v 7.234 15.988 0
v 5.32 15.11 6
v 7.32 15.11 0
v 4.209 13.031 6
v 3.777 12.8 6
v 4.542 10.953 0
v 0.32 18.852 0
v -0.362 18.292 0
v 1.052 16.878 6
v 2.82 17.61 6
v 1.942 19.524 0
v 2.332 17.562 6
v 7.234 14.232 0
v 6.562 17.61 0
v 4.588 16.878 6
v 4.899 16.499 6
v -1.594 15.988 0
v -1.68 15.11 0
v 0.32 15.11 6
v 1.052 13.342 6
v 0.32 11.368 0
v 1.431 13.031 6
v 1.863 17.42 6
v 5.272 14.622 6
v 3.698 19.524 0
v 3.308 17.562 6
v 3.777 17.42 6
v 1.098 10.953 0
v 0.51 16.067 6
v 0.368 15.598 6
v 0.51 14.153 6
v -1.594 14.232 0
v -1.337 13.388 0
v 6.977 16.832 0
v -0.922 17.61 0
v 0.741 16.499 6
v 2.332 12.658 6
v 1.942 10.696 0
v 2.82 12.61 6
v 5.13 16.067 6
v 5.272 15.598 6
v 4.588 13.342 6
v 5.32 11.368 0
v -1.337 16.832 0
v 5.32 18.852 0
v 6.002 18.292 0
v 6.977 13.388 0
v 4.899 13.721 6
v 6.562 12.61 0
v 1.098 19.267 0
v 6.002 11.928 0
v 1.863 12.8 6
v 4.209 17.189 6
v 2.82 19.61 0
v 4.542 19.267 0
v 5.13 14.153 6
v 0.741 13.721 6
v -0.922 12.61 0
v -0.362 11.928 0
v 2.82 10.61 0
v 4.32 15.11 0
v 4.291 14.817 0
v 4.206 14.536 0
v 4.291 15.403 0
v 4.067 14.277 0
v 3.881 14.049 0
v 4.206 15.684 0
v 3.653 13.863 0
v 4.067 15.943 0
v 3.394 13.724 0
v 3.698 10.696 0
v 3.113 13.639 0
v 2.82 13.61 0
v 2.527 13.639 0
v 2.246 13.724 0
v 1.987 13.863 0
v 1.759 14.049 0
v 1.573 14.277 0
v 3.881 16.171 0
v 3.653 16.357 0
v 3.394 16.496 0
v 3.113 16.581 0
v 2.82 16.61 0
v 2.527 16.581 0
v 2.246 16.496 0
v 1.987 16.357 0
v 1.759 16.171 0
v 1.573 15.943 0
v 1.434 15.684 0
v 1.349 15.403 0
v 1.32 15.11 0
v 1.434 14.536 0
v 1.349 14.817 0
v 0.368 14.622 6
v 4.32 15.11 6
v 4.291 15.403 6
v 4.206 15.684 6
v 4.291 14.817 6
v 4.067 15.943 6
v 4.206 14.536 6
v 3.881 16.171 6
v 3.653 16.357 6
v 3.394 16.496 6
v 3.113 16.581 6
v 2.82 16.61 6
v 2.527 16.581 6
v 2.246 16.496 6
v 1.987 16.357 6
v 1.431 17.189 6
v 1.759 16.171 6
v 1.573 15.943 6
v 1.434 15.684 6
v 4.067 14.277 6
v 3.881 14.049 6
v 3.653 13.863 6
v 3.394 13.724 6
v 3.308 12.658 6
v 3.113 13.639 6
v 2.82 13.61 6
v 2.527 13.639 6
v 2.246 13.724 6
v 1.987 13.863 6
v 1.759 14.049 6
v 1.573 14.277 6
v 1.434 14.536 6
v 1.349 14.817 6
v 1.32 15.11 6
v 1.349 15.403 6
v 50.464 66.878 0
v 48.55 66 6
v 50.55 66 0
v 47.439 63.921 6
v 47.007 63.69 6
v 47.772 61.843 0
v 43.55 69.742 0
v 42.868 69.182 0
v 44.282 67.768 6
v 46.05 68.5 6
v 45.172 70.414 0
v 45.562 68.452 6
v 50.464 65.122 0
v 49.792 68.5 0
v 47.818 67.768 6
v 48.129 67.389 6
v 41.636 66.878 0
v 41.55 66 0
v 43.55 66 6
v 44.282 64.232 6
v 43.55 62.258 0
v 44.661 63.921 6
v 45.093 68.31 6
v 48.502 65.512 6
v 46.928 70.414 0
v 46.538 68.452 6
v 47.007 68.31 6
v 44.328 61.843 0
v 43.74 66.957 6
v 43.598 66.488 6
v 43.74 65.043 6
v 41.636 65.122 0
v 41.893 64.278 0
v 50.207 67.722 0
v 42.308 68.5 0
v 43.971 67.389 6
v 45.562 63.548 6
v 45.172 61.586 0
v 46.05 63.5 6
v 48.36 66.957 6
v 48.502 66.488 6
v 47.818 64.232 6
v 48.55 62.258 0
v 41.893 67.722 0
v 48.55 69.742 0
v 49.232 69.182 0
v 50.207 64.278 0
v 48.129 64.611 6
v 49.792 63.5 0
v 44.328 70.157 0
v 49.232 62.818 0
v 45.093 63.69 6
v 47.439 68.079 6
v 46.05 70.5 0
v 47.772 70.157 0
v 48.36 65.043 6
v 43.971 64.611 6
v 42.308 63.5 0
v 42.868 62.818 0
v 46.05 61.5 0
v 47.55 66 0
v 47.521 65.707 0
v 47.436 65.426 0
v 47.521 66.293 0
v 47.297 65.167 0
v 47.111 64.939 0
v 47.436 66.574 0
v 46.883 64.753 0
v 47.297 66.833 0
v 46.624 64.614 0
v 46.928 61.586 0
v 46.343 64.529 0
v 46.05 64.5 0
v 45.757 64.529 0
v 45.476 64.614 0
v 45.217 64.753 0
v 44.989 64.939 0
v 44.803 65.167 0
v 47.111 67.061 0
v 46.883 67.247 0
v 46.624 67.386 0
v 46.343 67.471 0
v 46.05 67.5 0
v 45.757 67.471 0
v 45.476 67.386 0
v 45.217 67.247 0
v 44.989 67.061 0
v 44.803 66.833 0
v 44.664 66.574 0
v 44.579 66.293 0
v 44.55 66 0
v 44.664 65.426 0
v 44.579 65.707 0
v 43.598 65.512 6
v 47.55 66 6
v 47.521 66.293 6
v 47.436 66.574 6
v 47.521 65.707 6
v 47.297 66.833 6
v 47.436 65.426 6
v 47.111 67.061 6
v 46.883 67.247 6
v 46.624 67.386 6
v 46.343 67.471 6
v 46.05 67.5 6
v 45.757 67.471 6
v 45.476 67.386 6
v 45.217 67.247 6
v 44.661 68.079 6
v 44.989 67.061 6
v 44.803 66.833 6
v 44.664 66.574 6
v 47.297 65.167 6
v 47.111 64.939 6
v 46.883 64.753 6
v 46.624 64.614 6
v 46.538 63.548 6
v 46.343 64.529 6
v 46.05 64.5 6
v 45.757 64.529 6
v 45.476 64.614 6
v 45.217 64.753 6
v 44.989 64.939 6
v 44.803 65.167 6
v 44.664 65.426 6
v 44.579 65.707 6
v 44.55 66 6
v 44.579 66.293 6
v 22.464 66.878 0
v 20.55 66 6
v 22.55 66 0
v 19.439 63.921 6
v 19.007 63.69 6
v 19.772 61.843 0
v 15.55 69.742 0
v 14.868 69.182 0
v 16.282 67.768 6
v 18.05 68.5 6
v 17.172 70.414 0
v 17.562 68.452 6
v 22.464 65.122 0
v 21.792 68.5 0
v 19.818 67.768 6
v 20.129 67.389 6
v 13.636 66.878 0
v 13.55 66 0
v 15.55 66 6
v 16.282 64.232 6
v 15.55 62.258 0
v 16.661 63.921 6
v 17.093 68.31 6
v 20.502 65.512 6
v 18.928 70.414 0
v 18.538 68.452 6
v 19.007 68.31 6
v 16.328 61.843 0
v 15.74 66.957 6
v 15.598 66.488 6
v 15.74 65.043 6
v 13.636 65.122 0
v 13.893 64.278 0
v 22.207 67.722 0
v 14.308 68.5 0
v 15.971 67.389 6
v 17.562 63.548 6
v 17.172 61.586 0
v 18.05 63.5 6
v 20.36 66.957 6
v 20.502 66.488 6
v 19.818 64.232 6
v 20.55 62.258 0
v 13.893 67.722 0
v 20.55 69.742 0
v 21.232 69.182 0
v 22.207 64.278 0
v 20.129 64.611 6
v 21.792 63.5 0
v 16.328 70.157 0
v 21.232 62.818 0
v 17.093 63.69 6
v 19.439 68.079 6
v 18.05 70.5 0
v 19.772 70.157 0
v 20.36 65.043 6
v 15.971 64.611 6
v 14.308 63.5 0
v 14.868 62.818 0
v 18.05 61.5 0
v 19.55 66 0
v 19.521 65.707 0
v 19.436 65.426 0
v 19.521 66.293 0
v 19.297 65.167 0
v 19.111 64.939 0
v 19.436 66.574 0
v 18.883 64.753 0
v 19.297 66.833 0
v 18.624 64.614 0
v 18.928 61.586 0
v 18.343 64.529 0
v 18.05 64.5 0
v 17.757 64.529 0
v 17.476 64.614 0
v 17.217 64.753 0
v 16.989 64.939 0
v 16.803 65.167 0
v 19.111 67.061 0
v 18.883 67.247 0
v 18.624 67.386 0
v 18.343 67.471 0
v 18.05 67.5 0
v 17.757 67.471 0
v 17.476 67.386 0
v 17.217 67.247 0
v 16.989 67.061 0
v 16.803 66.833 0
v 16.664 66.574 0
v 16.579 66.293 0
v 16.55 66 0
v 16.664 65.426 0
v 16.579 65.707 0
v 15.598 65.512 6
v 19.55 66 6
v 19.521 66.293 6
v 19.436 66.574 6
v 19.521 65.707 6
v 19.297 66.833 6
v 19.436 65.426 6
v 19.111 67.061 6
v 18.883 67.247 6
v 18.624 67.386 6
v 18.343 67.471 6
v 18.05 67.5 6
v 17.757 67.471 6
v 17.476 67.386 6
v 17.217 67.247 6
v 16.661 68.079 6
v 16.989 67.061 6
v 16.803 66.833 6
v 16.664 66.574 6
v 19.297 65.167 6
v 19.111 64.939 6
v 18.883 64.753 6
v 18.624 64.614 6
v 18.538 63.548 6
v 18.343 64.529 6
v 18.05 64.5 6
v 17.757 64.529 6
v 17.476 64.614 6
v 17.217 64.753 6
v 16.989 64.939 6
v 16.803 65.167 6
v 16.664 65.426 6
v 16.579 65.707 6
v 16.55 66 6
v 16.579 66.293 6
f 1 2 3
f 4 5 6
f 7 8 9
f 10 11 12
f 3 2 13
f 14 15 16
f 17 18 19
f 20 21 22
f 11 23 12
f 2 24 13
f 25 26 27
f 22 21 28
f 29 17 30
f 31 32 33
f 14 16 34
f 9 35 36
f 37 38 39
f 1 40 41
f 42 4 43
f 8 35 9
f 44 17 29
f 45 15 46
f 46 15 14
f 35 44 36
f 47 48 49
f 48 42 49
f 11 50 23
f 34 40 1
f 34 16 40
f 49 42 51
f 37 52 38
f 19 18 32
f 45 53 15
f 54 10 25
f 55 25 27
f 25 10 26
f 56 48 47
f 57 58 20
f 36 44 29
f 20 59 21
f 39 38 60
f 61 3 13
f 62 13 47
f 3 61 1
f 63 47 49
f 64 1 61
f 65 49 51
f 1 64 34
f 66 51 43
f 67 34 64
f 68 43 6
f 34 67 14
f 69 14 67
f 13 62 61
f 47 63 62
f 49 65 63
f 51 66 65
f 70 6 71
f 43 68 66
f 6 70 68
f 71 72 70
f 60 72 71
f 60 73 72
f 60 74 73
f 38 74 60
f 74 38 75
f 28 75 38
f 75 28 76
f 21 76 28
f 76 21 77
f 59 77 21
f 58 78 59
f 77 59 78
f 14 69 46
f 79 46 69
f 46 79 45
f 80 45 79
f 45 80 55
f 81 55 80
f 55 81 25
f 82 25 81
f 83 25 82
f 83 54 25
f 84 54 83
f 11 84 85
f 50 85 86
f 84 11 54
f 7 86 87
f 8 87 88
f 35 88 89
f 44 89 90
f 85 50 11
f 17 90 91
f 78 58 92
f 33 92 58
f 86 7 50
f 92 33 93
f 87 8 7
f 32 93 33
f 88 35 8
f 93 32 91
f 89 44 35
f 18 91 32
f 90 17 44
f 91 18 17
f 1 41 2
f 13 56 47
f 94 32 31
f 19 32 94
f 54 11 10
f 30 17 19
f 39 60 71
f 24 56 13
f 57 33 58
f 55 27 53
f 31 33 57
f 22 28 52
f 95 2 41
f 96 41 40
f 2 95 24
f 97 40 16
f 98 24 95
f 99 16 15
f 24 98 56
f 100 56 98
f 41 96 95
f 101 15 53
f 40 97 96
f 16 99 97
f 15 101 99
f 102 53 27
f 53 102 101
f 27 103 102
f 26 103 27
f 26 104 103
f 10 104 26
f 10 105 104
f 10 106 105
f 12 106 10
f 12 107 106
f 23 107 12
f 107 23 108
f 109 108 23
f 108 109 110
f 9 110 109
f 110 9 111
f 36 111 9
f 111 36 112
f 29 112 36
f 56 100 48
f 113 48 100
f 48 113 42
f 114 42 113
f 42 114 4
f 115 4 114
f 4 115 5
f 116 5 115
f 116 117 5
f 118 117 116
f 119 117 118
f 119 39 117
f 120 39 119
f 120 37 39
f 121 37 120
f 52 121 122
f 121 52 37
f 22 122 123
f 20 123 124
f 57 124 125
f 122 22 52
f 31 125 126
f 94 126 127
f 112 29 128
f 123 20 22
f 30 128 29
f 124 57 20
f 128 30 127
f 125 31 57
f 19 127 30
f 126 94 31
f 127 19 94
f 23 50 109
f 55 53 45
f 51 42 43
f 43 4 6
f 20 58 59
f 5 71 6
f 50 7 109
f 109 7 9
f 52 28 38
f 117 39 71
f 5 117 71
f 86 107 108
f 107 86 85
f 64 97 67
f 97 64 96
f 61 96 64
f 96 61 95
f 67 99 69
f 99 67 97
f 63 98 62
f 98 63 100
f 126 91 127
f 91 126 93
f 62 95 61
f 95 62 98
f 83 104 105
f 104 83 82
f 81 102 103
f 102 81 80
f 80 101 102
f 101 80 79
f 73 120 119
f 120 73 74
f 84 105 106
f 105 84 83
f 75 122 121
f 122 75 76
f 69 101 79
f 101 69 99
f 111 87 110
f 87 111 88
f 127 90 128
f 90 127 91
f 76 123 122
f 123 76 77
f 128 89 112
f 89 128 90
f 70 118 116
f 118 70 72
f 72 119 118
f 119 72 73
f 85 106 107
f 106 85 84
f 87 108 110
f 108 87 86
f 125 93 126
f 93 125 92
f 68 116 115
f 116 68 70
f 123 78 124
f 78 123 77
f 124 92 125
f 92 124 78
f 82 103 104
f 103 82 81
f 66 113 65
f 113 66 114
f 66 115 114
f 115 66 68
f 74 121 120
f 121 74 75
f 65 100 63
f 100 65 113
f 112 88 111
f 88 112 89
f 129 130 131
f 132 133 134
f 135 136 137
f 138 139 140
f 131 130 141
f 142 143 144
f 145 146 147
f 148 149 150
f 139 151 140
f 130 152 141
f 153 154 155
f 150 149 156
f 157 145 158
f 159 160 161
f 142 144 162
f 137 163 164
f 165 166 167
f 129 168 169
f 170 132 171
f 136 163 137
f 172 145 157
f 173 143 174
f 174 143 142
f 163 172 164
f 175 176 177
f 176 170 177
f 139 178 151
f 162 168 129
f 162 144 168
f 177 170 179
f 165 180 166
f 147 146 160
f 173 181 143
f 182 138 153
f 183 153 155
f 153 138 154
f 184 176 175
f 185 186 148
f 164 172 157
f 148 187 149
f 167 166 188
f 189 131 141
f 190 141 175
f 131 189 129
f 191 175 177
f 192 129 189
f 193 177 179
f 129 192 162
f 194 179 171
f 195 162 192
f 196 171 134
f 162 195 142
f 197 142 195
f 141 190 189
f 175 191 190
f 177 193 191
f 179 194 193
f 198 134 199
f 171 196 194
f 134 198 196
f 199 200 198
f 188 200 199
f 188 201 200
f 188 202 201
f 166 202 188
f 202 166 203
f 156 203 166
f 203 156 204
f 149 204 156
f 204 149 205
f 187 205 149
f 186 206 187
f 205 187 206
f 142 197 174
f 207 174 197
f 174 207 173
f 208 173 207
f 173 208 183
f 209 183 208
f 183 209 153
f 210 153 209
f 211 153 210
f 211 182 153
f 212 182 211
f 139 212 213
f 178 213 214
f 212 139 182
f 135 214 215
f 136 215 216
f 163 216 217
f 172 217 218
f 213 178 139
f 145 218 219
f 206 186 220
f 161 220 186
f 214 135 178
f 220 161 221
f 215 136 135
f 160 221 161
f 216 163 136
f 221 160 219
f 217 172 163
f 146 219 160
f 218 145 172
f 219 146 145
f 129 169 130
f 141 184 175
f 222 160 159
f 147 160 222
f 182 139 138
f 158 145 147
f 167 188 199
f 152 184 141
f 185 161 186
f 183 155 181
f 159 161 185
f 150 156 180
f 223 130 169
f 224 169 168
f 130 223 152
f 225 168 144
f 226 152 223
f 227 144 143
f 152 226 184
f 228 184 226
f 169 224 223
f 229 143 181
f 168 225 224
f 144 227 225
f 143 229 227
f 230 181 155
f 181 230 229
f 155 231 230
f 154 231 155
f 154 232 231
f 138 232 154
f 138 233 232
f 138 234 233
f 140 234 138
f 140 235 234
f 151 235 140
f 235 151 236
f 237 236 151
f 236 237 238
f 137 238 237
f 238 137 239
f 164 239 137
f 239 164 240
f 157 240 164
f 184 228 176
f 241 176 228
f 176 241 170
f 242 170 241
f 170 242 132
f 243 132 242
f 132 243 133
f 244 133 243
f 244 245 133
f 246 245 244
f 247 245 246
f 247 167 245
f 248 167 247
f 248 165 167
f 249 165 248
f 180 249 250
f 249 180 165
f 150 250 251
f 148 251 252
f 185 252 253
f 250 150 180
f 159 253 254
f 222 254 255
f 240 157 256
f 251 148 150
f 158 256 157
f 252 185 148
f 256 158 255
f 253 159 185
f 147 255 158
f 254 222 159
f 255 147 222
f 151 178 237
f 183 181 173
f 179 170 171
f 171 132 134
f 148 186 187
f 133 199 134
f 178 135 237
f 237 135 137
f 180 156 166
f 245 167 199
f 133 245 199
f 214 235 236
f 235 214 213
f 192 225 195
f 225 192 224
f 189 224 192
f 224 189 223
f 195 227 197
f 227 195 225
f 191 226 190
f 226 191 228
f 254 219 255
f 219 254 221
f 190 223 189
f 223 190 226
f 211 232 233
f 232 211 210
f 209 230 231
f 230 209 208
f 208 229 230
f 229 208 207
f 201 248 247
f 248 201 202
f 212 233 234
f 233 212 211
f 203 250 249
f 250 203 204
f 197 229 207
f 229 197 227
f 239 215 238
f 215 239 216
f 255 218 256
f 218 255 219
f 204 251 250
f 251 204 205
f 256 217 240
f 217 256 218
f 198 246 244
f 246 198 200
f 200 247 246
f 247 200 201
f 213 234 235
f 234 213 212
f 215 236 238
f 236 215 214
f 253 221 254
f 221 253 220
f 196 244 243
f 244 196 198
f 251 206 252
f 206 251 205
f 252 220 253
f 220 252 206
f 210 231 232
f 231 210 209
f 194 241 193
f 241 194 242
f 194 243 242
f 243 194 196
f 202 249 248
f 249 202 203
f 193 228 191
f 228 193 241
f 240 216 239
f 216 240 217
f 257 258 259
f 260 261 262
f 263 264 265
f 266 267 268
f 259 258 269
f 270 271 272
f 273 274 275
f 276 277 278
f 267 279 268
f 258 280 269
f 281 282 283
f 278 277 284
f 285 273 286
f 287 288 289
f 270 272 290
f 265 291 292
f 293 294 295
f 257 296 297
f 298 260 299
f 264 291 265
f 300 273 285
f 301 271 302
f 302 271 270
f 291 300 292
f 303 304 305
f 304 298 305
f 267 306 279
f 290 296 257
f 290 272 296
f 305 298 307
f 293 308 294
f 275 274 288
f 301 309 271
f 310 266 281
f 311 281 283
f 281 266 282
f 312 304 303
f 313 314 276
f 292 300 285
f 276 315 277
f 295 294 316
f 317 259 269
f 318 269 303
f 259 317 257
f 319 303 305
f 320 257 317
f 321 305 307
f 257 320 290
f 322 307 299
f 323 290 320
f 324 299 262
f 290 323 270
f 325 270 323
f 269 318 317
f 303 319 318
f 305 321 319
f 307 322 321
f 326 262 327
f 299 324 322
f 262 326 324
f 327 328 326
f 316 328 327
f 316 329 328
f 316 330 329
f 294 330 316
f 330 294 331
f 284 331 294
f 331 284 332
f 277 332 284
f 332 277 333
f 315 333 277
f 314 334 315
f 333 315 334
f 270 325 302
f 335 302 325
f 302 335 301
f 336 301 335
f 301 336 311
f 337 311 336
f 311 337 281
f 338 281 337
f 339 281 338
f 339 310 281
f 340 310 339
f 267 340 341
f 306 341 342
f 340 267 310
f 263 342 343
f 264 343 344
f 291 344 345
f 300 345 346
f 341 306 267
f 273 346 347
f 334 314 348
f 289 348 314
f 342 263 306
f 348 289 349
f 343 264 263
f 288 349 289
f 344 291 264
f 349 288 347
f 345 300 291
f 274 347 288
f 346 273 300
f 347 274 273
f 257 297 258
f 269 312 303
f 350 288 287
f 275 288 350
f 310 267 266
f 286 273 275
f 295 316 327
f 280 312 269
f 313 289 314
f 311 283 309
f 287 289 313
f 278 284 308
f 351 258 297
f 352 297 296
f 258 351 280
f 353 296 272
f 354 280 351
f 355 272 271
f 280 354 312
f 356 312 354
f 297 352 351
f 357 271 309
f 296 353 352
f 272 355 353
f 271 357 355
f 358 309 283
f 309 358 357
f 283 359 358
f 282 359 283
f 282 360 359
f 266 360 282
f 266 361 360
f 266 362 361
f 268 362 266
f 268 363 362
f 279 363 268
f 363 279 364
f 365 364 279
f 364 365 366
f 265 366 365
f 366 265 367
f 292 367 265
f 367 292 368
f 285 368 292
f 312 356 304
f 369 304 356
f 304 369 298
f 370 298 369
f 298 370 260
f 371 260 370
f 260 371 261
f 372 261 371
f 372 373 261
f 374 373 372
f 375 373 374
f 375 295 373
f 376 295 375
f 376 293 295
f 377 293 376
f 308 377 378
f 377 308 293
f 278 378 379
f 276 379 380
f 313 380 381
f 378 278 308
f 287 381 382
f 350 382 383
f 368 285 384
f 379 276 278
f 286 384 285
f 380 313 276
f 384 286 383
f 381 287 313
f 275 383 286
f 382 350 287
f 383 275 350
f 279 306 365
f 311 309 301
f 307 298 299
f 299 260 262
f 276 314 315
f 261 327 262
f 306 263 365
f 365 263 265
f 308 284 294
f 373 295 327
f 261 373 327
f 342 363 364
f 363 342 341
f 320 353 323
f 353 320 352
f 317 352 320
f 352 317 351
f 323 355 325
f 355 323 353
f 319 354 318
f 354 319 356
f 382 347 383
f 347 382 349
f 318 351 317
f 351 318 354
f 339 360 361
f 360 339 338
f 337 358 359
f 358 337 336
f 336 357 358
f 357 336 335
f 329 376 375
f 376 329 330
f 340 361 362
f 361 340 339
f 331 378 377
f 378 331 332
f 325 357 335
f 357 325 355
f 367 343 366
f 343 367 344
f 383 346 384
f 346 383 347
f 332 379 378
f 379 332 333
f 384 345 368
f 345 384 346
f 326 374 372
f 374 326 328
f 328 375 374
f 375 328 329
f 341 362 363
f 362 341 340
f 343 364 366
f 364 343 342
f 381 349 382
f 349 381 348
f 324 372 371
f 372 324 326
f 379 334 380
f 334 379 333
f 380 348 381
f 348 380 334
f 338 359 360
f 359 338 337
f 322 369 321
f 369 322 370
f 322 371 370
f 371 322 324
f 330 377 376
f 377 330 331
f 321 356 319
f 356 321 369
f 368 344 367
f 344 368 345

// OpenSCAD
// Zrakotron arduino odjeljak

//univ. const.
uspace=2;
uheight=2;

//uno board
uno_w=53.25;
uno_ll=65.66;
uno_lr=68.56;

//pins
pin1=[50.95,13.6,0];    //uz power - ne koristiti za iteaduino
pin2=[2.82,15.11,0];    //uz usb
pin3=[46.05,66,0];      // uz procesor
pin4=[18.05,66,0];
pinr=3/2;
pinh=6;
//pin meta
outr=pinr+1;
botr=pinr+3;

screwholes();

module screwholes(){
    union(){
        translate(pin2)screwhole();
        translate(pin3)screwhole();
        translate(pin4)screwhole();
    }
}

module screwhole(){
    difference(){
        cylinder(pinh,botr,outr,false,$fn=32);
        translate([0,0,-0.5])cylinder(pinh+1,pinr,pinr,false,$fn=32);
    }
}
